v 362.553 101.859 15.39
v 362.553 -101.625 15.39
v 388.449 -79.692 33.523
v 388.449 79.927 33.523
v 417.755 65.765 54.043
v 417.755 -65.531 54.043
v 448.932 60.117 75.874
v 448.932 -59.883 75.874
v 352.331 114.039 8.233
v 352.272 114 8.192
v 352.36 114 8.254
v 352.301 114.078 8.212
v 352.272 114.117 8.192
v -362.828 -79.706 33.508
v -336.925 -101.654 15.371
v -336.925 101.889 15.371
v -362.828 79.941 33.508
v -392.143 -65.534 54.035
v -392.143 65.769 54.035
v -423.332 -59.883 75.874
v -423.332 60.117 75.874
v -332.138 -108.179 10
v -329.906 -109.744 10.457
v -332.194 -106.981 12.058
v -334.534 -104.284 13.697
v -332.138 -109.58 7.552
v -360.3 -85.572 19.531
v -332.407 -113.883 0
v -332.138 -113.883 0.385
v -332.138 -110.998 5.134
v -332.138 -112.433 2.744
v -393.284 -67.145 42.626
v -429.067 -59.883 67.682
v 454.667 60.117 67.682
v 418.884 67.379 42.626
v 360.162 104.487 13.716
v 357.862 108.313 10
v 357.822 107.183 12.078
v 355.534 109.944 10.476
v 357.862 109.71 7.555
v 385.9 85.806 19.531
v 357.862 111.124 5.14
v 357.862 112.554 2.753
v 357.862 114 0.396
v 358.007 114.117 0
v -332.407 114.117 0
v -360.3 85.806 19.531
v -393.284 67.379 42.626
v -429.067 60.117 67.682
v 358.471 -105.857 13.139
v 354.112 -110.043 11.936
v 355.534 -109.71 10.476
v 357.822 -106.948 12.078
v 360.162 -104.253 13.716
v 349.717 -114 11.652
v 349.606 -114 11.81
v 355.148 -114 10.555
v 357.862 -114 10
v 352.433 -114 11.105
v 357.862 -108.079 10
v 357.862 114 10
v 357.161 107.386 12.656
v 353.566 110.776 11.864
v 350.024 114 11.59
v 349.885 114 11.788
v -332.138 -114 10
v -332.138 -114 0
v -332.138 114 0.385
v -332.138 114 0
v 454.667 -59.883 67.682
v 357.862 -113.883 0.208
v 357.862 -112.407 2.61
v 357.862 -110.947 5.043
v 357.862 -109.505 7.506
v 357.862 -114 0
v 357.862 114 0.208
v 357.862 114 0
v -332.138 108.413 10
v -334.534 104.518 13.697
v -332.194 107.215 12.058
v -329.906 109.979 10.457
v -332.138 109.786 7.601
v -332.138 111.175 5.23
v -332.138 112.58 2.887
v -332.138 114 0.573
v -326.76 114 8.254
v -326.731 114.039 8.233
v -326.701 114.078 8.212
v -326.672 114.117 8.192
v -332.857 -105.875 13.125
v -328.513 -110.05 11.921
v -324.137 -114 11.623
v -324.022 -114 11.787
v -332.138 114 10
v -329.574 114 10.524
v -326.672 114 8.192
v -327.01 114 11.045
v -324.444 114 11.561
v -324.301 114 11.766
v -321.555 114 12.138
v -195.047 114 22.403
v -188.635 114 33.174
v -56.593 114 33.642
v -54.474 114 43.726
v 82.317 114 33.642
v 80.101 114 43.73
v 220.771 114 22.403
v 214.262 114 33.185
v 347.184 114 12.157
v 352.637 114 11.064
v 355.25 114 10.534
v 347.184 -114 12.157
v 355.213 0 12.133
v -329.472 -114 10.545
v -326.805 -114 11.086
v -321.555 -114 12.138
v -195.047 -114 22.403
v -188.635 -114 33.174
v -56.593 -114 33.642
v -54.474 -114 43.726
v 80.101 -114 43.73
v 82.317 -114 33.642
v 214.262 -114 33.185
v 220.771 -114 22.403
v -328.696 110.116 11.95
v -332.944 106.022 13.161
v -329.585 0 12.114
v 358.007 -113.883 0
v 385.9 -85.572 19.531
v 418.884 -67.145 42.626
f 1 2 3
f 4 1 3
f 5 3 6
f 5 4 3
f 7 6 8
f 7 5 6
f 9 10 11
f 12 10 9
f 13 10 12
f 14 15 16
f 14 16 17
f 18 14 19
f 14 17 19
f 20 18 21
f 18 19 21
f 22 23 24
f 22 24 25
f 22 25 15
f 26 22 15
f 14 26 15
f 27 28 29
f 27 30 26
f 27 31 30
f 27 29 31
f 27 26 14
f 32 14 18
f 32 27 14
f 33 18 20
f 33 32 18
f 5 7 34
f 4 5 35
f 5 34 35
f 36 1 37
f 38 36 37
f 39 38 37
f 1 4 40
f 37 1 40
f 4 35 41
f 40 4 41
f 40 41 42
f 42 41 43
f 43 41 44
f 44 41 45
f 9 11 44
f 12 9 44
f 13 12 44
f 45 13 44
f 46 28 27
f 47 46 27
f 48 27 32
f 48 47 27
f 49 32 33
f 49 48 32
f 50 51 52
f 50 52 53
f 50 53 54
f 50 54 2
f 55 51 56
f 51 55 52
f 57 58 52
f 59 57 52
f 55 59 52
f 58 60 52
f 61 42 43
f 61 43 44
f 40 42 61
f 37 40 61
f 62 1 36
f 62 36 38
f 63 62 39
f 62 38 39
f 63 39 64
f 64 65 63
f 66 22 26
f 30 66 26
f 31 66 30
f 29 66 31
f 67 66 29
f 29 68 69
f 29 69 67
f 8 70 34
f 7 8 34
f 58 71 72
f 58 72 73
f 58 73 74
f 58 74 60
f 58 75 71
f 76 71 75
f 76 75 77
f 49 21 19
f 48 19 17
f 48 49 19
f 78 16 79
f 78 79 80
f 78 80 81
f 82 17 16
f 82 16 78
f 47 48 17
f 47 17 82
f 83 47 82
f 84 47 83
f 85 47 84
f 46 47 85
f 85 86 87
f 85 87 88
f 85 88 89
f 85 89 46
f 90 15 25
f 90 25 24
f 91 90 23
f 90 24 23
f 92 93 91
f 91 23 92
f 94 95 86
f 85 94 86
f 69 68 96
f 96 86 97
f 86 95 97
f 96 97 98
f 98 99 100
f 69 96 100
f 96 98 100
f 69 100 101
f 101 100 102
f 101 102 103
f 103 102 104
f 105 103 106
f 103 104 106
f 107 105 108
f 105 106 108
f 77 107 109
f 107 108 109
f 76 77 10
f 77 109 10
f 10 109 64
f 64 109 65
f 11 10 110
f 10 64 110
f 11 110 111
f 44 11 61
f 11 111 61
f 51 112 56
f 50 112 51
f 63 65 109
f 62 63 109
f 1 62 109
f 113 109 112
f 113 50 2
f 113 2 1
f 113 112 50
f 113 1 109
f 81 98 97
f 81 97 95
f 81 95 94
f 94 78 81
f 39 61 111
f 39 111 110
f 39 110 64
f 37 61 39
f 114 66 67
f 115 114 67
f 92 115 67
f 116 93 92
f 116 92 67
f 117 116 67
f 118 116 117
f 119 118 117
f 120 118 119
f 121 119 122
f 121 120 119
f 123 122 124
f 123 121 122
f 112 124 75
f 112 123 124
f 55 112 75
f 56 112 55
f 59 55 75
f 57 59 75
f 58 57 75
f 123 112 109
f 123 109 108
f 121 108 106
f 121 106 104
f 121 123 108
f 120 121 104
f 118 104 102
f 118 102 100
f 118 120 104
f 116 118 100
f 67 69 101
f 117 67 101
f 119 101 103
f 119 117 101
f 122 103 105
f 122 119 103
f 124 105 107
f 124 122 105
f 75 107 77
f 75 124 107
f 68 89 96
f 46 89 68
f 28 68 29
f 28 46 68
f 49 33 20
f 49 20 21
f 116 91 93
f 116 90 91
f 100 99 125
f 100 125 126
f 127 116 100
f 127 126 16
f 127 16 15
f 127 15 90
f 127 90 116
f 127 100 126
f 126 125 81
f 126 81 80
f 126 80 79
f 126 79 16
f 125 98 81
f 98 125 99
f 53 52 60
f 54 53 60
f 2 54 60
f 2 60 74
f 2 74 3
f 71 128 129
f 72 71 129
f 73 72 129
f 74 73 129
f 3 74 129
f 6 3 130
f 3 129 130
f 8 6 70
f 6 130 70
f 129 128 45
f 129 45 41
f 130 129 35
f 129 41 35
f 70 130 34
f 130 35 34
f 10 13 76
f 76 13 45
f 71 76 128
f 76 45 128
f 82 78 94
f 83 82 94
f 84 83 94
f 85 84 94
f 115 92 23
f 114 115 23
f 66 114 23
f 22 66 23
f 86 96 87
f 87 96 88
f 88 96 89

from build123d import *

# Parameters (mm, degrees)
F1_DEPTH      = 114
F3_DEPTH      = 10
F4_ANGLE      = 35
F9_T4_DEPTH   = 262.5652555071
F9_S5_R       = 167.9439583926
F9_T6_DEPTH   = 133
F9_S7_R       = 167.9439583926
F9_T8_DEPTH   = 133
F10_T4_DEPTH  = 262.4928960507
F10_S7_R      = 167.9439583926
F10_T8_DEPTH  = 133
F10_S9_R      = 167.9439583926
F10_T10_DEPTH = 133


# Not quite as in the source:
# - a fillet or chamfer that OpenCascade refuses, or shapes differently, is made with other operations: its cross-section is extruded or revolved along the edge and cut away or added


with BuildPart() as f1:
    # F0 (on Front) → F1 (new body, symmetric)
    with BuildSketch(Plane.XZ):
        with BuildLine():
            ThreePointArc((-332.1381211281, 0), (12.8618788719, 35.0482151539), (357.8618788719, 0))
            Line((357.8618788719, 0), (357.8618788719, 10))
            ThreePointArc((357.8618788719, 10), (12.8618788719, 45.0482151539), (-332.1381211281, 10))
            Line((-332.1381211281, 10), (-332.1381211281, 0))
        make_face()
    extrude(amount=F1_DEPTH, both=True)


with BuildPart() as f3:
    # F2 (on Top) → F3 (new body)
    with BuildSketch(Plane.XY):
        with BuildLine():
            ThreePointArc((123.1073781215, 58.2170858979), (58.6810369853, 73.3595252621), (5.1073781215, 112.2170853764))
            Line((5.1073781215, 112.2170853764), (5.1073781215, -115.7829146236))
            ThreePointArc((5.1073781215, -115.7829146236), (58.6810369853, -76.9253545093), (123.1073781215, -61.7829151452))
            Line((123.1073781215, -61.7829151452), (123.1073781215, 58.2170858979))
        make_face()
    extrude(amount=F3_DEPTH)


with BuildPart() as f3_1:
    # F4: moved
    add(f3.part.rotate(Axis((5.1073781215, -1.7829146236, 0), (0, -1, 0)), F4_ANGLE))


with BuildPart() as f3_2:
    # F5: moved
    add(f3_1.part.moved(Location((352.9, 1.9, 0))))


with BuildPart() as f6_1:
    # F6: instance of F3
    add(f3_2.part.mirror(Plane.YZ))


with BuildPart() as f6_1_1:
    # F7: moved
    add(f6_1.part.moved(Location((25.6, 0, 0))))

    # F8: union F1, F3
    add(f1.part)
    add(f3_2.part)

    # F9: fillet of radius 20 on 1 edges, made by hand


with BuildPart() as f9_tool2:
    # F9_s3 → F9_t4 (new body)
    with BuildSketch(Plane.XZ.offset(-131.39971313)):
        with BuildLine():
            add(Edge.make_bspline(
                [(-336.9253398984, 15.3712567812), (-329.9304765428, 10.4734007308), (-321.5551366342, 12.1379693445)],
                knots=[0, 0, 0, 1, 1, 1], degree=2, weights=[1, 1, 1]))
            ThreePointArc((-321.5551366342, 12.1379693445), (-325.7318557218, 11.3024702142), (-329.9064875028, 10.4566034242))
            Line((-329.9064875028, 10.4566034242), (-336.9253398984, 15.3712567812))
        make_face()
    extrude(amount=F9_T4_DEPTH)

    # F9_s5 → F9_t6 (cut, symmetric)
    with BuildSketch(Plane(origin=(-102.2686786014, 0, -146.0548094967), x_dir=(0, 1, 0), z_dir=(-0.5735764364, 0, -0.8191520443))):
        with Locations((-227.7381227134, -395.7513456072)):
            Circle(F9_S5_R)
    extrude(amount=F9_T6_DEPTH, both=True, mode=Mode.SUBTRACT)

    # F9_s7 → F9_t8 (cut, symmetric)
    with BuildSketch(Plane(origin=(-102.2686786014, 0, -146.0548094967), x_dir=(0, 1, 0), z_dir=(-0.5735764364, 0, -0.8191520443))):
        with Locations((227.9722934661, -395.7513456072)):
            Circle(F9_S7_R)
    extrude(amount=F9_T8_DEPTH, both=True, mode=Mode.SUBTRACT)

    split(bisect_by=Plane.XZ.offset(114), keep=Keep.BOTTOM)

    split(bisect_by=Plane.XZ.offset(-114), keep=Keep.TOP)


with BuildPart() as f6_1_2:
    add(f6_1_1.part)

    # F9_t1: union F9_tool2
    add(f9_tool2.part)

    # F10: fillet of radius 20 on 1 edges, made by hand


with BuildPart() as f10_tool2:
    # F10_s3 → F10_t4 (new body)
    with BuildSketch(Plane.XZ.offset(-131.3635334017)):
        with BuildLine():
            add(Edge.make_bspline(
                [(347.1836055083, 12.1569048592), (355.5583829749, 10.492941025), (362.5526978832, 15.3904130484)],
                knots=[0, 0, 0, 1, 1, 1], degree=2, weights=[1, 1, 1]))
            Line((362.5526978832, 15.3904130484), (355.5343963998, 10.4761454443))
            ThreePointArc((355.5343963998, 10.4761454443), (351.360044149, 11.3217082271), (347.1836055083, 12.1569048592))
        make_face()
    extrude(amount=F10_T4_DEPTH)

    split(bisect_by=Plane.XZ.offset(114), keep=Keep.BOTTOM)

    split(bisect_by=Plane.XZ.offset(-114), keep=Keep.TOP)

    # F10_s7 → F10_t8 (cut, symmetric)
    with BuildSketch(Plane(origin=(110.6428945721, 0, -158.0144293433), x_dir=(0, 1, 0), z_dir=(0.5735764364, 0, -0.8191520443))):
        with Locations((227.9722934661, 416.721637941)):
            Circle(F10_S7_R)
    extrude(amount=F10_T8_DEPTH, both=True, mode=Mode.SUBTRACT)

    # F10_s9 → F10_t10 (cut, symmetric)
    with BuildSketch(Plane(origin=(110.6428945721, 0, -158.0144293433), x_dir=(0, 1, 0), z_dir=(0.5735764364, 0, -0.8191520443))):
        with Locations((-227.7381227134, 416.721637941)):
            Circle(F10_S9_R)
    extrude(amount=F10_T10_DEPTH, both=True, mode=Mode.SUBTRACT)


with BuildPart() as f6_1_3:
    add(f6_1_2.part)

    # F10_t1: union F10_tool2
    add(f10_tool2.part)


solid = f6_1_3.part
